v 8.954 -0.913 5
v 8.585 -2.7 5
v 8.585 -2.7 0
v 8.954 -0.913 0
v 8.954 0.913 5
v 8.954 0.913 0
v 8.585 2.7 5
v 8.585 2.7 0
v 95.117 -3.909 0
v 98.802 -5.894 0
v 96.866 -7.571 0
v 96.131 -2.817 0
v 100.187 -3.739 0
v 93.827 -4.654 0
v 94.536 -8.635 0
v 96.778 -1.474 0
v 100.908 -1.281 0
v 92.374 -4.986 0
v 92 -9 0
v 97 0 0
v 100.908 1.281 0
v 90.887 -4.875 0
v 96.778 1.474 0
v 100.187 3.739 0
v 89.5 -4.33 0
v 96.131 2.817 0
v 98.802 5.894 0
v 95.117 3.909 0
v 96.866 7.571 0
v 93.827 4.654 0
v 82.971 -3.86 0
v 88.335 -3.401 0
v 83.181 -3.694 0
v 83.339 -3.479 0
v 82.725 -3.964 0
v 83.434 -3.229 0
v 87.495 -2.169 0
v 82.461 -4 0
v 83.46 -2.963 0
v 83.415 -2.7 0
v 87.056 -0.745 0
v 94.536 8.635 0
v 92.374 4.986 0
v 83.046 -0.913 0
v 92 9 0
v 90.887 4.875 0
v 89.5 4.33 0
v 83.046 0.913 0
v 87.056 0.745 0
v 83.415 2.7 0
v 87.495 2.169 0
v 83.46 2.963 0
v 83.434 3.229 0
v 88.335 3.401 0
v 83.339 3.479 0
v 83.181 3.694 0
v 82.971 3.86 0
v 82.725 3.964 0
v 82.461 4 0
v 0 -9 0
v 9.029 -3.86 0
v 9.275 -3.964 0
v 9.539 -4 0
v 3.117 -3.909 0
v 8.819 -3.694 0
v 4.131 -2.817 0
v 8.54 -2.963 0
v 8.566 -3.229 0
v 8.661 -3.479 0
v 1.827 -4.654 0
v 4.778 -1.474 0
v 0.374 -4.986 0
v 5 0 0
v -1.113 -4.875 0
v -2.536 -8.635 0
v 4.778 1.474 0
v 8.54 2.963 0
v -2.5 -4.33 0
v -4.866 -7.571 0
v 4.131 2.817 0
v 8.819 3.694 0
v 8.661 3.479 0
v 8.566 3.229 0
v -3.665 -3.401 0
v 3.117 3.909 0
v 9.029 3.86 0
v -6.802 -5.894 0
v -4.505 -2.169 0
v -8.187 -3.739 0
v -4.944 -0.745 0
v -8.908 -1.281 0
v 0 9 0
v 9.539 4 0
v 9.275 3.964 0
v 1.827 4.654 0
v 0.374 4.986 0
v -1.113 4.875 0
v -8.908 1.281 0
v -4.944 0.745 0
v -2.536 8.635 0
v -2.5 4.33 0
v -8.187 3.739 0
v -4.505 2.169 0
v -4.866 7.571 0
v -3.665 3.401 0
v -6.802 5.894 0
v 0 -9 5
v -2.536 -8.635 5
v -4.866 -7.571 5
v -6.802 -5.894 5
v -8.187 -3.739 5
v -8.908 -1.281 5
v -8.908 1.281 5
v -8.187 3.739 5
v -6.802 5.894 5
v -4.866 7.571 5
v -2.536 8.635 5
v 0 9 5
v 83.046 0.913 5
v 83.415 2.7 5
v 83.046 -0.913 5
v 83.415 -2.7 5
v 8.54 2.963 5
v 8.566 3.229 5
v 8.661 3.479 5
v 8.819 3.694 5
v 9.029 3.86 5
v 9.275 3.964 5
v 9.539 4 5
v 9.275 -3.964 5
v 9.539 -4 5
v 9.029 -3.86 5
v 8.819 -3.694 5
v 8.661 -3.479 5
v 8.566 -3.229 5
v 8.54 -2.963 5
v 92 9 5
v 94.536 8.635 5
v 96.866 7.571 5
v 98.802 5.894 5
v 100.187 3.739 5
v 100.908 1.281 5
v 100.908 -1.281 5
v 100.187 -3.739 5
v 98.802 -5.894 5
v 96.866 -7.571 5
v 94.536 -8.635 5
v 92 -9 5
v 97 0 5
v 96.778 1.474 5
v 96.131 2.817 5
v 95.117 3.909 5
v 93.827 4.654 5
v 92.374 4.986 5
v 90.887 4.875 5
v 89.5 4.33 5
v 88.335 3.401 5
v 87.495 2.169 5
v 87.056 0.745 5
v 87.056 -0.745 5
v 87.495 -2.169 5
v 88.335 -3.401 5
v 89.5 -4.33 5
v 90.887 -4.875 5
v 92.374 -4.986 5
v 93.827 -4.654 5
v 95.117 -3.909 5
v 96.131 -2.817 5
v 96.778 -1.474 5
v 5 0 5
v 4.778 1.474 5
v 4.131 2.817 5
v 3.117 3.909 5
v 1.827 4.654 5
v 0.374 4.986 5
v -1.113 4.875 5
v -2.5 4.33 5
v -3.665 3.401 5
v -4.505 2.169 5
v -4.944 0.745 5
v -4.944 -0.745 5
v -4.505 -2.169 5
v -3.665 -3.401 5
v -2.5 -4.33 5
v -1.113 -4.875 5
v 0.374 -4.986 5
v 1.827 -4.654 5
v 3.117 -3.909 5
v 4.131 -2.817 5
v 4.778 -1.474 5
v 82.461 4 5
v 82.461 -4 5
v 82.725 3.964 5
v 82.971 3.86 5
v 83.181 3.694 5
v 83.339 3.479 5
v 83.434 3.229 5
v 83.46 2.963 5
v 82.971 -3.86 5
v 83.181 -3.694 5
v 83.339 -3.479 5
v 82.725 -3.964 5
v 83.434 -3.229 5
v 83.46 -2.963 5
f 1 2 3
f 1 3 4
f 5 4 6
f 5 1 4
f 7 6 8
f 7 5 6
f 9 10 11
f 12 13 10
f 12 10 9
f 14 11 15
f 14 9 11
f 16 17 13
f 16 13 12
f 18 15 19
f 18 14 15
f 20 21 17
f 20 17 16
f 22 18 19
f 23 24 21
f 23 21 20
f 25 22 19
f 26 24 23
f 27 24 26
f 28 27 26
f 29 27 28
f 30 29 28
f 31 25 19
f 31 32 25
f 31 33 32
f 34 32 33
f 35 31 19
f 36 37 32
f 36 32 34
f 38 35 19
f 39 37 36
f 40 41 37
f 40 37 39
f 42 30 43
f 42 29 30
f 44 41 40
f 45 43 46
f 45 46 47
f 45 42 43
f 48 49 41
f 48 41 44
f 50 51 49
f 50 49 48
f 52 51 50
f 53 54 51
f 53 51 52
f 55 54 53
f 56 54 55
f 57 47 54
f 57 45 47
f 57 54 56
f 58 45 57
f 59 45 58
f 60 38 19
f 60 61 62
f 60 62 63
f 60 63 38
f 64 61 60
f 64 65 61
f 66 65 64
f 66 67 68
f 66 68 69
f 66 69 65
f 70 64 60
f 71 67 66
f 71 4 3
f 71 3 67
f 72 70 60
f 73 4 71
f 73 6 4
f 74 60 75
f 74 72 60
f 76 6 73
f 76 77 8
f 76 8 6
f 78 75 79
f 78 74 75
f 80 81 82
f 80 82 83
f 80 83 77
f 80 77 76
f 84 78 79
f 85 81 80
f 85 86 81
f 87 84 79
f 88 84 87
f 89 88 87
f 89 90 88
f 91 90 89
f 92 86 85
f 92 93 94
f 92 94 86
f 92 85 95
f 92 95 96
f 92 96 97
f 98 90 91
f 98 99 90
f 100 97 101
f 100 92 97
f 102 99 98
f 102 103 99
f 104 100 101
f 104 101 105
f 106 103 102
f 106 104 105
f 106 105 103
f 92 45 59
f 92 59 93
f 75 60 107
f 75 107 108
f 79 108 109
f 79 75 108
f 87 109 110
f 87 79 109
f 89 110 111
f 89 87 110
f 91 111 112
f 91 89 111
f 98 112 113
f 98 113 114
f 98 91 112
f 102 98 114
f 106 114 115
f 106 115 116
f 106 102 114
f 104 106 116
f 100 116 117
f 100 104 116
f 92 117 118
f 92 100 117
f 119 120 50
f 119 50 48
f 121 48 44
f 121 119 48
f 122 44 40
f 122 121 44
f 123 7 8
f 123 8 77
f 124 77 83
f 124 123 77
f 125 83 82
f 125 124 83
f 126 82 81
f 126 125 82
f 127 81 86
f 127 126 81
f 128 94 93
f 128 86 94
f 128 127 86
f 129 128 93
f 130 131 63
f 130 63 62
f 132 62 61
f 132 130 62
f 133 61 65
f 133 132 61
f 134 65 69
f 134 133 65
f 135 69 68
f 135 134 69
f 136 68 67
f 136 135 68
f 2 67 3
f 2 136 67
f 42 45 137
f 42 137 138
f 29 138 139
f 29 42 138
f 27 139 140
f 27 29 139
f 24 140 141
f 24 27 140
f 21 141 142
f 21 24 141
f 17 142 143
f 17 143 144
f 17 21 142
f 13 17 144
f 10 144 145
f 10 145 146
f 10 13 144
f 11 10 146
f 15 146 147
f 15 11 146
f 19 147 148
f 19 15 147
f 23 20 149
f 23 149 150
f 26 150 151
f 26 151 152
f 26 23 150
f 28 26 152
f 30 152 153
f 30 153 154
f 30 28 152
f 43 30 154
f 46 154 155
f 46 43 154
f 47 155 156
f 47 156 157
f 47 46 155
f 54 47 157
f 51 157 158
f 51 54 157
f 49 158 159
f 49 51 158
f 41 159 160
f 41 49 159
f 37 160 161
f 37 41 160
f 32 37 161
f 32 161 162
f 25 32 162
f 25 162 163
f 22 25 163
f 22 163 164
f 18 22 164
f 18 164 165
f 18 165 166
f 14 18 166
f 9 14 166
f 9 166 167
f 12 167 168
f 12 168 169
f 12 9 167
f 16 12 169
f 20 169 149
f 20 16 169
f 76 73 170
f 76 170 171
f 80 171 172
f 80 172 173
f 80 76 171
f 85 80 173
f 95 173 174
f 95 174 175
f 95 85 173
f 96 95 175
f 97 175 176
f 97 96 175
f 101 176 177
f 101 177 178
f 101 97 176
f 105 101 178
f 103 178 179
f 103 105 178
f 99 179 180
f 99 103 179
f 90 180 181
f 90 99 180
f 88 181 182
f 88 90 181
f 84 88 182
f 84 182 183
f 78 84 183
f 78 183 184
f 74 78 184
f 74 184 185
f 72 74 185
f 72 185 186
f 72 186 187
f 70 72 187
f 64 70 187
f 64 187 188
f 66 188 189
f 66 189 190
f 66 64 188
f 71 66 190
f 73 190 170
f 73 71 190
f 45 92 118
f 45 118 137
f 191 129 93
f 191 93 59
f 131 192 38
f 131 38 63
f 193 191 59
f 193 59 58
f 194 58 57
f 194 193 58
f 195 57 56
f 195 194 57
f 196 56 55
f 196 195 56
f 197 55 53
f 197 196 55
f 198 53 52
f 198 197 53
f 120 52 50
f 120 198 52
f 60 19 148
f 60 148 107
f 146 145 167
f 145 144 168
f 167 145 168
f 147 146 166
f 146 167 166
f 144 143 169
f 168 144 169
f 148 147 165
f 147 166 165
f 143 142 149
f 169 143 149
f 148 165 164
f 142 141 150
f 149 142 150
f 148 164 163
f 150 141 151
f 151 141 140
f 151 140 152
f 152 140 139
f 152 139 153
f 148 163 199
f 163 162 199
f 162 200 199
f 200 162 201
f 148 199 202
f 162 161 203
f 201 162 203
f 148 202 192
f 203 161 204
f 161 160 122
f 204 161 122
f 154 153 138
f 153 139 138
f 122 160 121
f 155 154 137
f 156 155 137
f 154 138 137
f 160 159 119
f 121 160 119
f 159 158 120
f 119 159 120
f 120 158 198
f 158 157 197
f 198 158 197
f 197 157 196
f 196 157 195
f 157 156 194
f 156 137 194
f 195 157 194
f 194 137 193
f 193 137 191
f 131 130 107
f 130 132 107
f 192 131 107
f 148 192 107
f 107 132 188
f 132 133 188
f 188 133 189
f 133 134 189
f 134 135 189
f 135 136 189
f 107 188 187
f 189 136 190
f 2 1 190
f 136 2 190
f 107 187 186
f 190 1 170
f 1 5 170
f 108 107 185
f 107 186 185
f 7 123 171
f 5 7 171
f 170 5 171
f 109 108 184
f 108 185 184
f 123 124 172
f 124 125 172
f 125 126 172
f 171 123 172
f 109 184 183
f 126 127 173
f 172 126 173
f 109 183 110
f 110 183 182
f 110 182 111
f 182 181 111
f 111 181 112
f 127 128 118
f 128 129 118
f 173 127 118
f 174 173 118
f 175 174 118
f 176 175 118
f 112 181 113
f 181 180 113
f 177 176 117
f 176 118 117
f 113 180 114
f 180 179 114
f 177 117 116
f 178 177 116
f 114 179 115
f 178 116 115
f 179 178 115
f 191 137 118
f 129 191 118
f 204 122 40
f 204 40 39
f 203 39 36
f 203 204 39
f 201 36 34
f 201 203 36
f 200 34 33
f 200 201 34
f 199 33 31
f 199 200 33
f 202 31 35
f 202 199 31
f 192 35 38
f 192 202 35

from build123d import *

# Parameters (mm, degrees)
SKETCH_1_R          = 5
EXTRUDE_1_DEPTH     = 5
CUT_EXTRUDE_1_DEPTH = 102.523396318


with BuildPart() as part:
    # 草图1 → 凸台-拉伸1 (new body)
    with BuildSketch(Plane.XY):
        with BuildLine():
            Line((0, 9), (92, 9))
            ThreePointArc((92, 9), (101, 0), (92, -9))
            Line((92, -9), (0, -9))
            ThreePointArc((0, -9), (-9, 0), (0, 9))
        make_face()
        Circle(SKETCH_1_R, mode=Mode.SUBTRACT)
        with Locations((92, 0)):
            Circle(SKETCH_1_R, mode=Mode.SUBTRACT)
    extrude(amount=EXTRUDE_1_DEPTH)

    # 草图2 → 切除-拉伸1 (cut, through all)
    with BuildSketch(Plane.XY.offset(5)):
        with BuildLine():
            Line((9.539392014, 4), (82.460607986, 4))
            ThreePointArc((82.460607986, 4), (83.266833761, 3.591607978), (83.414547187, 2.7))
            ThreePointArc((83.414547187, 2.7), (83, 0), (83.414547187, -2.7))
            ThreePointArc((83.414547187, -2.7), (83.266833761, -3.591607978), (82.460607986, -4))
            Line((82.460607986, -4), (9.539392014, -4))
            ThreePointArc((9.539392014, -4), (8.733166239, -3.591607978), (8.585452813, -2.7))
            ThreePointArc((8.585452813, -2.7), (9, 0), (8.585452813, 2.7))
            ThreePointArc((8.585452813, 2.7), (8.733166239, 3.591607978), (9.539392014, 4))
        make_face()
    extrude(amount=-CUT_EXTRUDE_1_DEPTH, mode=Mode.SUBTRACT)


solid = part.part
